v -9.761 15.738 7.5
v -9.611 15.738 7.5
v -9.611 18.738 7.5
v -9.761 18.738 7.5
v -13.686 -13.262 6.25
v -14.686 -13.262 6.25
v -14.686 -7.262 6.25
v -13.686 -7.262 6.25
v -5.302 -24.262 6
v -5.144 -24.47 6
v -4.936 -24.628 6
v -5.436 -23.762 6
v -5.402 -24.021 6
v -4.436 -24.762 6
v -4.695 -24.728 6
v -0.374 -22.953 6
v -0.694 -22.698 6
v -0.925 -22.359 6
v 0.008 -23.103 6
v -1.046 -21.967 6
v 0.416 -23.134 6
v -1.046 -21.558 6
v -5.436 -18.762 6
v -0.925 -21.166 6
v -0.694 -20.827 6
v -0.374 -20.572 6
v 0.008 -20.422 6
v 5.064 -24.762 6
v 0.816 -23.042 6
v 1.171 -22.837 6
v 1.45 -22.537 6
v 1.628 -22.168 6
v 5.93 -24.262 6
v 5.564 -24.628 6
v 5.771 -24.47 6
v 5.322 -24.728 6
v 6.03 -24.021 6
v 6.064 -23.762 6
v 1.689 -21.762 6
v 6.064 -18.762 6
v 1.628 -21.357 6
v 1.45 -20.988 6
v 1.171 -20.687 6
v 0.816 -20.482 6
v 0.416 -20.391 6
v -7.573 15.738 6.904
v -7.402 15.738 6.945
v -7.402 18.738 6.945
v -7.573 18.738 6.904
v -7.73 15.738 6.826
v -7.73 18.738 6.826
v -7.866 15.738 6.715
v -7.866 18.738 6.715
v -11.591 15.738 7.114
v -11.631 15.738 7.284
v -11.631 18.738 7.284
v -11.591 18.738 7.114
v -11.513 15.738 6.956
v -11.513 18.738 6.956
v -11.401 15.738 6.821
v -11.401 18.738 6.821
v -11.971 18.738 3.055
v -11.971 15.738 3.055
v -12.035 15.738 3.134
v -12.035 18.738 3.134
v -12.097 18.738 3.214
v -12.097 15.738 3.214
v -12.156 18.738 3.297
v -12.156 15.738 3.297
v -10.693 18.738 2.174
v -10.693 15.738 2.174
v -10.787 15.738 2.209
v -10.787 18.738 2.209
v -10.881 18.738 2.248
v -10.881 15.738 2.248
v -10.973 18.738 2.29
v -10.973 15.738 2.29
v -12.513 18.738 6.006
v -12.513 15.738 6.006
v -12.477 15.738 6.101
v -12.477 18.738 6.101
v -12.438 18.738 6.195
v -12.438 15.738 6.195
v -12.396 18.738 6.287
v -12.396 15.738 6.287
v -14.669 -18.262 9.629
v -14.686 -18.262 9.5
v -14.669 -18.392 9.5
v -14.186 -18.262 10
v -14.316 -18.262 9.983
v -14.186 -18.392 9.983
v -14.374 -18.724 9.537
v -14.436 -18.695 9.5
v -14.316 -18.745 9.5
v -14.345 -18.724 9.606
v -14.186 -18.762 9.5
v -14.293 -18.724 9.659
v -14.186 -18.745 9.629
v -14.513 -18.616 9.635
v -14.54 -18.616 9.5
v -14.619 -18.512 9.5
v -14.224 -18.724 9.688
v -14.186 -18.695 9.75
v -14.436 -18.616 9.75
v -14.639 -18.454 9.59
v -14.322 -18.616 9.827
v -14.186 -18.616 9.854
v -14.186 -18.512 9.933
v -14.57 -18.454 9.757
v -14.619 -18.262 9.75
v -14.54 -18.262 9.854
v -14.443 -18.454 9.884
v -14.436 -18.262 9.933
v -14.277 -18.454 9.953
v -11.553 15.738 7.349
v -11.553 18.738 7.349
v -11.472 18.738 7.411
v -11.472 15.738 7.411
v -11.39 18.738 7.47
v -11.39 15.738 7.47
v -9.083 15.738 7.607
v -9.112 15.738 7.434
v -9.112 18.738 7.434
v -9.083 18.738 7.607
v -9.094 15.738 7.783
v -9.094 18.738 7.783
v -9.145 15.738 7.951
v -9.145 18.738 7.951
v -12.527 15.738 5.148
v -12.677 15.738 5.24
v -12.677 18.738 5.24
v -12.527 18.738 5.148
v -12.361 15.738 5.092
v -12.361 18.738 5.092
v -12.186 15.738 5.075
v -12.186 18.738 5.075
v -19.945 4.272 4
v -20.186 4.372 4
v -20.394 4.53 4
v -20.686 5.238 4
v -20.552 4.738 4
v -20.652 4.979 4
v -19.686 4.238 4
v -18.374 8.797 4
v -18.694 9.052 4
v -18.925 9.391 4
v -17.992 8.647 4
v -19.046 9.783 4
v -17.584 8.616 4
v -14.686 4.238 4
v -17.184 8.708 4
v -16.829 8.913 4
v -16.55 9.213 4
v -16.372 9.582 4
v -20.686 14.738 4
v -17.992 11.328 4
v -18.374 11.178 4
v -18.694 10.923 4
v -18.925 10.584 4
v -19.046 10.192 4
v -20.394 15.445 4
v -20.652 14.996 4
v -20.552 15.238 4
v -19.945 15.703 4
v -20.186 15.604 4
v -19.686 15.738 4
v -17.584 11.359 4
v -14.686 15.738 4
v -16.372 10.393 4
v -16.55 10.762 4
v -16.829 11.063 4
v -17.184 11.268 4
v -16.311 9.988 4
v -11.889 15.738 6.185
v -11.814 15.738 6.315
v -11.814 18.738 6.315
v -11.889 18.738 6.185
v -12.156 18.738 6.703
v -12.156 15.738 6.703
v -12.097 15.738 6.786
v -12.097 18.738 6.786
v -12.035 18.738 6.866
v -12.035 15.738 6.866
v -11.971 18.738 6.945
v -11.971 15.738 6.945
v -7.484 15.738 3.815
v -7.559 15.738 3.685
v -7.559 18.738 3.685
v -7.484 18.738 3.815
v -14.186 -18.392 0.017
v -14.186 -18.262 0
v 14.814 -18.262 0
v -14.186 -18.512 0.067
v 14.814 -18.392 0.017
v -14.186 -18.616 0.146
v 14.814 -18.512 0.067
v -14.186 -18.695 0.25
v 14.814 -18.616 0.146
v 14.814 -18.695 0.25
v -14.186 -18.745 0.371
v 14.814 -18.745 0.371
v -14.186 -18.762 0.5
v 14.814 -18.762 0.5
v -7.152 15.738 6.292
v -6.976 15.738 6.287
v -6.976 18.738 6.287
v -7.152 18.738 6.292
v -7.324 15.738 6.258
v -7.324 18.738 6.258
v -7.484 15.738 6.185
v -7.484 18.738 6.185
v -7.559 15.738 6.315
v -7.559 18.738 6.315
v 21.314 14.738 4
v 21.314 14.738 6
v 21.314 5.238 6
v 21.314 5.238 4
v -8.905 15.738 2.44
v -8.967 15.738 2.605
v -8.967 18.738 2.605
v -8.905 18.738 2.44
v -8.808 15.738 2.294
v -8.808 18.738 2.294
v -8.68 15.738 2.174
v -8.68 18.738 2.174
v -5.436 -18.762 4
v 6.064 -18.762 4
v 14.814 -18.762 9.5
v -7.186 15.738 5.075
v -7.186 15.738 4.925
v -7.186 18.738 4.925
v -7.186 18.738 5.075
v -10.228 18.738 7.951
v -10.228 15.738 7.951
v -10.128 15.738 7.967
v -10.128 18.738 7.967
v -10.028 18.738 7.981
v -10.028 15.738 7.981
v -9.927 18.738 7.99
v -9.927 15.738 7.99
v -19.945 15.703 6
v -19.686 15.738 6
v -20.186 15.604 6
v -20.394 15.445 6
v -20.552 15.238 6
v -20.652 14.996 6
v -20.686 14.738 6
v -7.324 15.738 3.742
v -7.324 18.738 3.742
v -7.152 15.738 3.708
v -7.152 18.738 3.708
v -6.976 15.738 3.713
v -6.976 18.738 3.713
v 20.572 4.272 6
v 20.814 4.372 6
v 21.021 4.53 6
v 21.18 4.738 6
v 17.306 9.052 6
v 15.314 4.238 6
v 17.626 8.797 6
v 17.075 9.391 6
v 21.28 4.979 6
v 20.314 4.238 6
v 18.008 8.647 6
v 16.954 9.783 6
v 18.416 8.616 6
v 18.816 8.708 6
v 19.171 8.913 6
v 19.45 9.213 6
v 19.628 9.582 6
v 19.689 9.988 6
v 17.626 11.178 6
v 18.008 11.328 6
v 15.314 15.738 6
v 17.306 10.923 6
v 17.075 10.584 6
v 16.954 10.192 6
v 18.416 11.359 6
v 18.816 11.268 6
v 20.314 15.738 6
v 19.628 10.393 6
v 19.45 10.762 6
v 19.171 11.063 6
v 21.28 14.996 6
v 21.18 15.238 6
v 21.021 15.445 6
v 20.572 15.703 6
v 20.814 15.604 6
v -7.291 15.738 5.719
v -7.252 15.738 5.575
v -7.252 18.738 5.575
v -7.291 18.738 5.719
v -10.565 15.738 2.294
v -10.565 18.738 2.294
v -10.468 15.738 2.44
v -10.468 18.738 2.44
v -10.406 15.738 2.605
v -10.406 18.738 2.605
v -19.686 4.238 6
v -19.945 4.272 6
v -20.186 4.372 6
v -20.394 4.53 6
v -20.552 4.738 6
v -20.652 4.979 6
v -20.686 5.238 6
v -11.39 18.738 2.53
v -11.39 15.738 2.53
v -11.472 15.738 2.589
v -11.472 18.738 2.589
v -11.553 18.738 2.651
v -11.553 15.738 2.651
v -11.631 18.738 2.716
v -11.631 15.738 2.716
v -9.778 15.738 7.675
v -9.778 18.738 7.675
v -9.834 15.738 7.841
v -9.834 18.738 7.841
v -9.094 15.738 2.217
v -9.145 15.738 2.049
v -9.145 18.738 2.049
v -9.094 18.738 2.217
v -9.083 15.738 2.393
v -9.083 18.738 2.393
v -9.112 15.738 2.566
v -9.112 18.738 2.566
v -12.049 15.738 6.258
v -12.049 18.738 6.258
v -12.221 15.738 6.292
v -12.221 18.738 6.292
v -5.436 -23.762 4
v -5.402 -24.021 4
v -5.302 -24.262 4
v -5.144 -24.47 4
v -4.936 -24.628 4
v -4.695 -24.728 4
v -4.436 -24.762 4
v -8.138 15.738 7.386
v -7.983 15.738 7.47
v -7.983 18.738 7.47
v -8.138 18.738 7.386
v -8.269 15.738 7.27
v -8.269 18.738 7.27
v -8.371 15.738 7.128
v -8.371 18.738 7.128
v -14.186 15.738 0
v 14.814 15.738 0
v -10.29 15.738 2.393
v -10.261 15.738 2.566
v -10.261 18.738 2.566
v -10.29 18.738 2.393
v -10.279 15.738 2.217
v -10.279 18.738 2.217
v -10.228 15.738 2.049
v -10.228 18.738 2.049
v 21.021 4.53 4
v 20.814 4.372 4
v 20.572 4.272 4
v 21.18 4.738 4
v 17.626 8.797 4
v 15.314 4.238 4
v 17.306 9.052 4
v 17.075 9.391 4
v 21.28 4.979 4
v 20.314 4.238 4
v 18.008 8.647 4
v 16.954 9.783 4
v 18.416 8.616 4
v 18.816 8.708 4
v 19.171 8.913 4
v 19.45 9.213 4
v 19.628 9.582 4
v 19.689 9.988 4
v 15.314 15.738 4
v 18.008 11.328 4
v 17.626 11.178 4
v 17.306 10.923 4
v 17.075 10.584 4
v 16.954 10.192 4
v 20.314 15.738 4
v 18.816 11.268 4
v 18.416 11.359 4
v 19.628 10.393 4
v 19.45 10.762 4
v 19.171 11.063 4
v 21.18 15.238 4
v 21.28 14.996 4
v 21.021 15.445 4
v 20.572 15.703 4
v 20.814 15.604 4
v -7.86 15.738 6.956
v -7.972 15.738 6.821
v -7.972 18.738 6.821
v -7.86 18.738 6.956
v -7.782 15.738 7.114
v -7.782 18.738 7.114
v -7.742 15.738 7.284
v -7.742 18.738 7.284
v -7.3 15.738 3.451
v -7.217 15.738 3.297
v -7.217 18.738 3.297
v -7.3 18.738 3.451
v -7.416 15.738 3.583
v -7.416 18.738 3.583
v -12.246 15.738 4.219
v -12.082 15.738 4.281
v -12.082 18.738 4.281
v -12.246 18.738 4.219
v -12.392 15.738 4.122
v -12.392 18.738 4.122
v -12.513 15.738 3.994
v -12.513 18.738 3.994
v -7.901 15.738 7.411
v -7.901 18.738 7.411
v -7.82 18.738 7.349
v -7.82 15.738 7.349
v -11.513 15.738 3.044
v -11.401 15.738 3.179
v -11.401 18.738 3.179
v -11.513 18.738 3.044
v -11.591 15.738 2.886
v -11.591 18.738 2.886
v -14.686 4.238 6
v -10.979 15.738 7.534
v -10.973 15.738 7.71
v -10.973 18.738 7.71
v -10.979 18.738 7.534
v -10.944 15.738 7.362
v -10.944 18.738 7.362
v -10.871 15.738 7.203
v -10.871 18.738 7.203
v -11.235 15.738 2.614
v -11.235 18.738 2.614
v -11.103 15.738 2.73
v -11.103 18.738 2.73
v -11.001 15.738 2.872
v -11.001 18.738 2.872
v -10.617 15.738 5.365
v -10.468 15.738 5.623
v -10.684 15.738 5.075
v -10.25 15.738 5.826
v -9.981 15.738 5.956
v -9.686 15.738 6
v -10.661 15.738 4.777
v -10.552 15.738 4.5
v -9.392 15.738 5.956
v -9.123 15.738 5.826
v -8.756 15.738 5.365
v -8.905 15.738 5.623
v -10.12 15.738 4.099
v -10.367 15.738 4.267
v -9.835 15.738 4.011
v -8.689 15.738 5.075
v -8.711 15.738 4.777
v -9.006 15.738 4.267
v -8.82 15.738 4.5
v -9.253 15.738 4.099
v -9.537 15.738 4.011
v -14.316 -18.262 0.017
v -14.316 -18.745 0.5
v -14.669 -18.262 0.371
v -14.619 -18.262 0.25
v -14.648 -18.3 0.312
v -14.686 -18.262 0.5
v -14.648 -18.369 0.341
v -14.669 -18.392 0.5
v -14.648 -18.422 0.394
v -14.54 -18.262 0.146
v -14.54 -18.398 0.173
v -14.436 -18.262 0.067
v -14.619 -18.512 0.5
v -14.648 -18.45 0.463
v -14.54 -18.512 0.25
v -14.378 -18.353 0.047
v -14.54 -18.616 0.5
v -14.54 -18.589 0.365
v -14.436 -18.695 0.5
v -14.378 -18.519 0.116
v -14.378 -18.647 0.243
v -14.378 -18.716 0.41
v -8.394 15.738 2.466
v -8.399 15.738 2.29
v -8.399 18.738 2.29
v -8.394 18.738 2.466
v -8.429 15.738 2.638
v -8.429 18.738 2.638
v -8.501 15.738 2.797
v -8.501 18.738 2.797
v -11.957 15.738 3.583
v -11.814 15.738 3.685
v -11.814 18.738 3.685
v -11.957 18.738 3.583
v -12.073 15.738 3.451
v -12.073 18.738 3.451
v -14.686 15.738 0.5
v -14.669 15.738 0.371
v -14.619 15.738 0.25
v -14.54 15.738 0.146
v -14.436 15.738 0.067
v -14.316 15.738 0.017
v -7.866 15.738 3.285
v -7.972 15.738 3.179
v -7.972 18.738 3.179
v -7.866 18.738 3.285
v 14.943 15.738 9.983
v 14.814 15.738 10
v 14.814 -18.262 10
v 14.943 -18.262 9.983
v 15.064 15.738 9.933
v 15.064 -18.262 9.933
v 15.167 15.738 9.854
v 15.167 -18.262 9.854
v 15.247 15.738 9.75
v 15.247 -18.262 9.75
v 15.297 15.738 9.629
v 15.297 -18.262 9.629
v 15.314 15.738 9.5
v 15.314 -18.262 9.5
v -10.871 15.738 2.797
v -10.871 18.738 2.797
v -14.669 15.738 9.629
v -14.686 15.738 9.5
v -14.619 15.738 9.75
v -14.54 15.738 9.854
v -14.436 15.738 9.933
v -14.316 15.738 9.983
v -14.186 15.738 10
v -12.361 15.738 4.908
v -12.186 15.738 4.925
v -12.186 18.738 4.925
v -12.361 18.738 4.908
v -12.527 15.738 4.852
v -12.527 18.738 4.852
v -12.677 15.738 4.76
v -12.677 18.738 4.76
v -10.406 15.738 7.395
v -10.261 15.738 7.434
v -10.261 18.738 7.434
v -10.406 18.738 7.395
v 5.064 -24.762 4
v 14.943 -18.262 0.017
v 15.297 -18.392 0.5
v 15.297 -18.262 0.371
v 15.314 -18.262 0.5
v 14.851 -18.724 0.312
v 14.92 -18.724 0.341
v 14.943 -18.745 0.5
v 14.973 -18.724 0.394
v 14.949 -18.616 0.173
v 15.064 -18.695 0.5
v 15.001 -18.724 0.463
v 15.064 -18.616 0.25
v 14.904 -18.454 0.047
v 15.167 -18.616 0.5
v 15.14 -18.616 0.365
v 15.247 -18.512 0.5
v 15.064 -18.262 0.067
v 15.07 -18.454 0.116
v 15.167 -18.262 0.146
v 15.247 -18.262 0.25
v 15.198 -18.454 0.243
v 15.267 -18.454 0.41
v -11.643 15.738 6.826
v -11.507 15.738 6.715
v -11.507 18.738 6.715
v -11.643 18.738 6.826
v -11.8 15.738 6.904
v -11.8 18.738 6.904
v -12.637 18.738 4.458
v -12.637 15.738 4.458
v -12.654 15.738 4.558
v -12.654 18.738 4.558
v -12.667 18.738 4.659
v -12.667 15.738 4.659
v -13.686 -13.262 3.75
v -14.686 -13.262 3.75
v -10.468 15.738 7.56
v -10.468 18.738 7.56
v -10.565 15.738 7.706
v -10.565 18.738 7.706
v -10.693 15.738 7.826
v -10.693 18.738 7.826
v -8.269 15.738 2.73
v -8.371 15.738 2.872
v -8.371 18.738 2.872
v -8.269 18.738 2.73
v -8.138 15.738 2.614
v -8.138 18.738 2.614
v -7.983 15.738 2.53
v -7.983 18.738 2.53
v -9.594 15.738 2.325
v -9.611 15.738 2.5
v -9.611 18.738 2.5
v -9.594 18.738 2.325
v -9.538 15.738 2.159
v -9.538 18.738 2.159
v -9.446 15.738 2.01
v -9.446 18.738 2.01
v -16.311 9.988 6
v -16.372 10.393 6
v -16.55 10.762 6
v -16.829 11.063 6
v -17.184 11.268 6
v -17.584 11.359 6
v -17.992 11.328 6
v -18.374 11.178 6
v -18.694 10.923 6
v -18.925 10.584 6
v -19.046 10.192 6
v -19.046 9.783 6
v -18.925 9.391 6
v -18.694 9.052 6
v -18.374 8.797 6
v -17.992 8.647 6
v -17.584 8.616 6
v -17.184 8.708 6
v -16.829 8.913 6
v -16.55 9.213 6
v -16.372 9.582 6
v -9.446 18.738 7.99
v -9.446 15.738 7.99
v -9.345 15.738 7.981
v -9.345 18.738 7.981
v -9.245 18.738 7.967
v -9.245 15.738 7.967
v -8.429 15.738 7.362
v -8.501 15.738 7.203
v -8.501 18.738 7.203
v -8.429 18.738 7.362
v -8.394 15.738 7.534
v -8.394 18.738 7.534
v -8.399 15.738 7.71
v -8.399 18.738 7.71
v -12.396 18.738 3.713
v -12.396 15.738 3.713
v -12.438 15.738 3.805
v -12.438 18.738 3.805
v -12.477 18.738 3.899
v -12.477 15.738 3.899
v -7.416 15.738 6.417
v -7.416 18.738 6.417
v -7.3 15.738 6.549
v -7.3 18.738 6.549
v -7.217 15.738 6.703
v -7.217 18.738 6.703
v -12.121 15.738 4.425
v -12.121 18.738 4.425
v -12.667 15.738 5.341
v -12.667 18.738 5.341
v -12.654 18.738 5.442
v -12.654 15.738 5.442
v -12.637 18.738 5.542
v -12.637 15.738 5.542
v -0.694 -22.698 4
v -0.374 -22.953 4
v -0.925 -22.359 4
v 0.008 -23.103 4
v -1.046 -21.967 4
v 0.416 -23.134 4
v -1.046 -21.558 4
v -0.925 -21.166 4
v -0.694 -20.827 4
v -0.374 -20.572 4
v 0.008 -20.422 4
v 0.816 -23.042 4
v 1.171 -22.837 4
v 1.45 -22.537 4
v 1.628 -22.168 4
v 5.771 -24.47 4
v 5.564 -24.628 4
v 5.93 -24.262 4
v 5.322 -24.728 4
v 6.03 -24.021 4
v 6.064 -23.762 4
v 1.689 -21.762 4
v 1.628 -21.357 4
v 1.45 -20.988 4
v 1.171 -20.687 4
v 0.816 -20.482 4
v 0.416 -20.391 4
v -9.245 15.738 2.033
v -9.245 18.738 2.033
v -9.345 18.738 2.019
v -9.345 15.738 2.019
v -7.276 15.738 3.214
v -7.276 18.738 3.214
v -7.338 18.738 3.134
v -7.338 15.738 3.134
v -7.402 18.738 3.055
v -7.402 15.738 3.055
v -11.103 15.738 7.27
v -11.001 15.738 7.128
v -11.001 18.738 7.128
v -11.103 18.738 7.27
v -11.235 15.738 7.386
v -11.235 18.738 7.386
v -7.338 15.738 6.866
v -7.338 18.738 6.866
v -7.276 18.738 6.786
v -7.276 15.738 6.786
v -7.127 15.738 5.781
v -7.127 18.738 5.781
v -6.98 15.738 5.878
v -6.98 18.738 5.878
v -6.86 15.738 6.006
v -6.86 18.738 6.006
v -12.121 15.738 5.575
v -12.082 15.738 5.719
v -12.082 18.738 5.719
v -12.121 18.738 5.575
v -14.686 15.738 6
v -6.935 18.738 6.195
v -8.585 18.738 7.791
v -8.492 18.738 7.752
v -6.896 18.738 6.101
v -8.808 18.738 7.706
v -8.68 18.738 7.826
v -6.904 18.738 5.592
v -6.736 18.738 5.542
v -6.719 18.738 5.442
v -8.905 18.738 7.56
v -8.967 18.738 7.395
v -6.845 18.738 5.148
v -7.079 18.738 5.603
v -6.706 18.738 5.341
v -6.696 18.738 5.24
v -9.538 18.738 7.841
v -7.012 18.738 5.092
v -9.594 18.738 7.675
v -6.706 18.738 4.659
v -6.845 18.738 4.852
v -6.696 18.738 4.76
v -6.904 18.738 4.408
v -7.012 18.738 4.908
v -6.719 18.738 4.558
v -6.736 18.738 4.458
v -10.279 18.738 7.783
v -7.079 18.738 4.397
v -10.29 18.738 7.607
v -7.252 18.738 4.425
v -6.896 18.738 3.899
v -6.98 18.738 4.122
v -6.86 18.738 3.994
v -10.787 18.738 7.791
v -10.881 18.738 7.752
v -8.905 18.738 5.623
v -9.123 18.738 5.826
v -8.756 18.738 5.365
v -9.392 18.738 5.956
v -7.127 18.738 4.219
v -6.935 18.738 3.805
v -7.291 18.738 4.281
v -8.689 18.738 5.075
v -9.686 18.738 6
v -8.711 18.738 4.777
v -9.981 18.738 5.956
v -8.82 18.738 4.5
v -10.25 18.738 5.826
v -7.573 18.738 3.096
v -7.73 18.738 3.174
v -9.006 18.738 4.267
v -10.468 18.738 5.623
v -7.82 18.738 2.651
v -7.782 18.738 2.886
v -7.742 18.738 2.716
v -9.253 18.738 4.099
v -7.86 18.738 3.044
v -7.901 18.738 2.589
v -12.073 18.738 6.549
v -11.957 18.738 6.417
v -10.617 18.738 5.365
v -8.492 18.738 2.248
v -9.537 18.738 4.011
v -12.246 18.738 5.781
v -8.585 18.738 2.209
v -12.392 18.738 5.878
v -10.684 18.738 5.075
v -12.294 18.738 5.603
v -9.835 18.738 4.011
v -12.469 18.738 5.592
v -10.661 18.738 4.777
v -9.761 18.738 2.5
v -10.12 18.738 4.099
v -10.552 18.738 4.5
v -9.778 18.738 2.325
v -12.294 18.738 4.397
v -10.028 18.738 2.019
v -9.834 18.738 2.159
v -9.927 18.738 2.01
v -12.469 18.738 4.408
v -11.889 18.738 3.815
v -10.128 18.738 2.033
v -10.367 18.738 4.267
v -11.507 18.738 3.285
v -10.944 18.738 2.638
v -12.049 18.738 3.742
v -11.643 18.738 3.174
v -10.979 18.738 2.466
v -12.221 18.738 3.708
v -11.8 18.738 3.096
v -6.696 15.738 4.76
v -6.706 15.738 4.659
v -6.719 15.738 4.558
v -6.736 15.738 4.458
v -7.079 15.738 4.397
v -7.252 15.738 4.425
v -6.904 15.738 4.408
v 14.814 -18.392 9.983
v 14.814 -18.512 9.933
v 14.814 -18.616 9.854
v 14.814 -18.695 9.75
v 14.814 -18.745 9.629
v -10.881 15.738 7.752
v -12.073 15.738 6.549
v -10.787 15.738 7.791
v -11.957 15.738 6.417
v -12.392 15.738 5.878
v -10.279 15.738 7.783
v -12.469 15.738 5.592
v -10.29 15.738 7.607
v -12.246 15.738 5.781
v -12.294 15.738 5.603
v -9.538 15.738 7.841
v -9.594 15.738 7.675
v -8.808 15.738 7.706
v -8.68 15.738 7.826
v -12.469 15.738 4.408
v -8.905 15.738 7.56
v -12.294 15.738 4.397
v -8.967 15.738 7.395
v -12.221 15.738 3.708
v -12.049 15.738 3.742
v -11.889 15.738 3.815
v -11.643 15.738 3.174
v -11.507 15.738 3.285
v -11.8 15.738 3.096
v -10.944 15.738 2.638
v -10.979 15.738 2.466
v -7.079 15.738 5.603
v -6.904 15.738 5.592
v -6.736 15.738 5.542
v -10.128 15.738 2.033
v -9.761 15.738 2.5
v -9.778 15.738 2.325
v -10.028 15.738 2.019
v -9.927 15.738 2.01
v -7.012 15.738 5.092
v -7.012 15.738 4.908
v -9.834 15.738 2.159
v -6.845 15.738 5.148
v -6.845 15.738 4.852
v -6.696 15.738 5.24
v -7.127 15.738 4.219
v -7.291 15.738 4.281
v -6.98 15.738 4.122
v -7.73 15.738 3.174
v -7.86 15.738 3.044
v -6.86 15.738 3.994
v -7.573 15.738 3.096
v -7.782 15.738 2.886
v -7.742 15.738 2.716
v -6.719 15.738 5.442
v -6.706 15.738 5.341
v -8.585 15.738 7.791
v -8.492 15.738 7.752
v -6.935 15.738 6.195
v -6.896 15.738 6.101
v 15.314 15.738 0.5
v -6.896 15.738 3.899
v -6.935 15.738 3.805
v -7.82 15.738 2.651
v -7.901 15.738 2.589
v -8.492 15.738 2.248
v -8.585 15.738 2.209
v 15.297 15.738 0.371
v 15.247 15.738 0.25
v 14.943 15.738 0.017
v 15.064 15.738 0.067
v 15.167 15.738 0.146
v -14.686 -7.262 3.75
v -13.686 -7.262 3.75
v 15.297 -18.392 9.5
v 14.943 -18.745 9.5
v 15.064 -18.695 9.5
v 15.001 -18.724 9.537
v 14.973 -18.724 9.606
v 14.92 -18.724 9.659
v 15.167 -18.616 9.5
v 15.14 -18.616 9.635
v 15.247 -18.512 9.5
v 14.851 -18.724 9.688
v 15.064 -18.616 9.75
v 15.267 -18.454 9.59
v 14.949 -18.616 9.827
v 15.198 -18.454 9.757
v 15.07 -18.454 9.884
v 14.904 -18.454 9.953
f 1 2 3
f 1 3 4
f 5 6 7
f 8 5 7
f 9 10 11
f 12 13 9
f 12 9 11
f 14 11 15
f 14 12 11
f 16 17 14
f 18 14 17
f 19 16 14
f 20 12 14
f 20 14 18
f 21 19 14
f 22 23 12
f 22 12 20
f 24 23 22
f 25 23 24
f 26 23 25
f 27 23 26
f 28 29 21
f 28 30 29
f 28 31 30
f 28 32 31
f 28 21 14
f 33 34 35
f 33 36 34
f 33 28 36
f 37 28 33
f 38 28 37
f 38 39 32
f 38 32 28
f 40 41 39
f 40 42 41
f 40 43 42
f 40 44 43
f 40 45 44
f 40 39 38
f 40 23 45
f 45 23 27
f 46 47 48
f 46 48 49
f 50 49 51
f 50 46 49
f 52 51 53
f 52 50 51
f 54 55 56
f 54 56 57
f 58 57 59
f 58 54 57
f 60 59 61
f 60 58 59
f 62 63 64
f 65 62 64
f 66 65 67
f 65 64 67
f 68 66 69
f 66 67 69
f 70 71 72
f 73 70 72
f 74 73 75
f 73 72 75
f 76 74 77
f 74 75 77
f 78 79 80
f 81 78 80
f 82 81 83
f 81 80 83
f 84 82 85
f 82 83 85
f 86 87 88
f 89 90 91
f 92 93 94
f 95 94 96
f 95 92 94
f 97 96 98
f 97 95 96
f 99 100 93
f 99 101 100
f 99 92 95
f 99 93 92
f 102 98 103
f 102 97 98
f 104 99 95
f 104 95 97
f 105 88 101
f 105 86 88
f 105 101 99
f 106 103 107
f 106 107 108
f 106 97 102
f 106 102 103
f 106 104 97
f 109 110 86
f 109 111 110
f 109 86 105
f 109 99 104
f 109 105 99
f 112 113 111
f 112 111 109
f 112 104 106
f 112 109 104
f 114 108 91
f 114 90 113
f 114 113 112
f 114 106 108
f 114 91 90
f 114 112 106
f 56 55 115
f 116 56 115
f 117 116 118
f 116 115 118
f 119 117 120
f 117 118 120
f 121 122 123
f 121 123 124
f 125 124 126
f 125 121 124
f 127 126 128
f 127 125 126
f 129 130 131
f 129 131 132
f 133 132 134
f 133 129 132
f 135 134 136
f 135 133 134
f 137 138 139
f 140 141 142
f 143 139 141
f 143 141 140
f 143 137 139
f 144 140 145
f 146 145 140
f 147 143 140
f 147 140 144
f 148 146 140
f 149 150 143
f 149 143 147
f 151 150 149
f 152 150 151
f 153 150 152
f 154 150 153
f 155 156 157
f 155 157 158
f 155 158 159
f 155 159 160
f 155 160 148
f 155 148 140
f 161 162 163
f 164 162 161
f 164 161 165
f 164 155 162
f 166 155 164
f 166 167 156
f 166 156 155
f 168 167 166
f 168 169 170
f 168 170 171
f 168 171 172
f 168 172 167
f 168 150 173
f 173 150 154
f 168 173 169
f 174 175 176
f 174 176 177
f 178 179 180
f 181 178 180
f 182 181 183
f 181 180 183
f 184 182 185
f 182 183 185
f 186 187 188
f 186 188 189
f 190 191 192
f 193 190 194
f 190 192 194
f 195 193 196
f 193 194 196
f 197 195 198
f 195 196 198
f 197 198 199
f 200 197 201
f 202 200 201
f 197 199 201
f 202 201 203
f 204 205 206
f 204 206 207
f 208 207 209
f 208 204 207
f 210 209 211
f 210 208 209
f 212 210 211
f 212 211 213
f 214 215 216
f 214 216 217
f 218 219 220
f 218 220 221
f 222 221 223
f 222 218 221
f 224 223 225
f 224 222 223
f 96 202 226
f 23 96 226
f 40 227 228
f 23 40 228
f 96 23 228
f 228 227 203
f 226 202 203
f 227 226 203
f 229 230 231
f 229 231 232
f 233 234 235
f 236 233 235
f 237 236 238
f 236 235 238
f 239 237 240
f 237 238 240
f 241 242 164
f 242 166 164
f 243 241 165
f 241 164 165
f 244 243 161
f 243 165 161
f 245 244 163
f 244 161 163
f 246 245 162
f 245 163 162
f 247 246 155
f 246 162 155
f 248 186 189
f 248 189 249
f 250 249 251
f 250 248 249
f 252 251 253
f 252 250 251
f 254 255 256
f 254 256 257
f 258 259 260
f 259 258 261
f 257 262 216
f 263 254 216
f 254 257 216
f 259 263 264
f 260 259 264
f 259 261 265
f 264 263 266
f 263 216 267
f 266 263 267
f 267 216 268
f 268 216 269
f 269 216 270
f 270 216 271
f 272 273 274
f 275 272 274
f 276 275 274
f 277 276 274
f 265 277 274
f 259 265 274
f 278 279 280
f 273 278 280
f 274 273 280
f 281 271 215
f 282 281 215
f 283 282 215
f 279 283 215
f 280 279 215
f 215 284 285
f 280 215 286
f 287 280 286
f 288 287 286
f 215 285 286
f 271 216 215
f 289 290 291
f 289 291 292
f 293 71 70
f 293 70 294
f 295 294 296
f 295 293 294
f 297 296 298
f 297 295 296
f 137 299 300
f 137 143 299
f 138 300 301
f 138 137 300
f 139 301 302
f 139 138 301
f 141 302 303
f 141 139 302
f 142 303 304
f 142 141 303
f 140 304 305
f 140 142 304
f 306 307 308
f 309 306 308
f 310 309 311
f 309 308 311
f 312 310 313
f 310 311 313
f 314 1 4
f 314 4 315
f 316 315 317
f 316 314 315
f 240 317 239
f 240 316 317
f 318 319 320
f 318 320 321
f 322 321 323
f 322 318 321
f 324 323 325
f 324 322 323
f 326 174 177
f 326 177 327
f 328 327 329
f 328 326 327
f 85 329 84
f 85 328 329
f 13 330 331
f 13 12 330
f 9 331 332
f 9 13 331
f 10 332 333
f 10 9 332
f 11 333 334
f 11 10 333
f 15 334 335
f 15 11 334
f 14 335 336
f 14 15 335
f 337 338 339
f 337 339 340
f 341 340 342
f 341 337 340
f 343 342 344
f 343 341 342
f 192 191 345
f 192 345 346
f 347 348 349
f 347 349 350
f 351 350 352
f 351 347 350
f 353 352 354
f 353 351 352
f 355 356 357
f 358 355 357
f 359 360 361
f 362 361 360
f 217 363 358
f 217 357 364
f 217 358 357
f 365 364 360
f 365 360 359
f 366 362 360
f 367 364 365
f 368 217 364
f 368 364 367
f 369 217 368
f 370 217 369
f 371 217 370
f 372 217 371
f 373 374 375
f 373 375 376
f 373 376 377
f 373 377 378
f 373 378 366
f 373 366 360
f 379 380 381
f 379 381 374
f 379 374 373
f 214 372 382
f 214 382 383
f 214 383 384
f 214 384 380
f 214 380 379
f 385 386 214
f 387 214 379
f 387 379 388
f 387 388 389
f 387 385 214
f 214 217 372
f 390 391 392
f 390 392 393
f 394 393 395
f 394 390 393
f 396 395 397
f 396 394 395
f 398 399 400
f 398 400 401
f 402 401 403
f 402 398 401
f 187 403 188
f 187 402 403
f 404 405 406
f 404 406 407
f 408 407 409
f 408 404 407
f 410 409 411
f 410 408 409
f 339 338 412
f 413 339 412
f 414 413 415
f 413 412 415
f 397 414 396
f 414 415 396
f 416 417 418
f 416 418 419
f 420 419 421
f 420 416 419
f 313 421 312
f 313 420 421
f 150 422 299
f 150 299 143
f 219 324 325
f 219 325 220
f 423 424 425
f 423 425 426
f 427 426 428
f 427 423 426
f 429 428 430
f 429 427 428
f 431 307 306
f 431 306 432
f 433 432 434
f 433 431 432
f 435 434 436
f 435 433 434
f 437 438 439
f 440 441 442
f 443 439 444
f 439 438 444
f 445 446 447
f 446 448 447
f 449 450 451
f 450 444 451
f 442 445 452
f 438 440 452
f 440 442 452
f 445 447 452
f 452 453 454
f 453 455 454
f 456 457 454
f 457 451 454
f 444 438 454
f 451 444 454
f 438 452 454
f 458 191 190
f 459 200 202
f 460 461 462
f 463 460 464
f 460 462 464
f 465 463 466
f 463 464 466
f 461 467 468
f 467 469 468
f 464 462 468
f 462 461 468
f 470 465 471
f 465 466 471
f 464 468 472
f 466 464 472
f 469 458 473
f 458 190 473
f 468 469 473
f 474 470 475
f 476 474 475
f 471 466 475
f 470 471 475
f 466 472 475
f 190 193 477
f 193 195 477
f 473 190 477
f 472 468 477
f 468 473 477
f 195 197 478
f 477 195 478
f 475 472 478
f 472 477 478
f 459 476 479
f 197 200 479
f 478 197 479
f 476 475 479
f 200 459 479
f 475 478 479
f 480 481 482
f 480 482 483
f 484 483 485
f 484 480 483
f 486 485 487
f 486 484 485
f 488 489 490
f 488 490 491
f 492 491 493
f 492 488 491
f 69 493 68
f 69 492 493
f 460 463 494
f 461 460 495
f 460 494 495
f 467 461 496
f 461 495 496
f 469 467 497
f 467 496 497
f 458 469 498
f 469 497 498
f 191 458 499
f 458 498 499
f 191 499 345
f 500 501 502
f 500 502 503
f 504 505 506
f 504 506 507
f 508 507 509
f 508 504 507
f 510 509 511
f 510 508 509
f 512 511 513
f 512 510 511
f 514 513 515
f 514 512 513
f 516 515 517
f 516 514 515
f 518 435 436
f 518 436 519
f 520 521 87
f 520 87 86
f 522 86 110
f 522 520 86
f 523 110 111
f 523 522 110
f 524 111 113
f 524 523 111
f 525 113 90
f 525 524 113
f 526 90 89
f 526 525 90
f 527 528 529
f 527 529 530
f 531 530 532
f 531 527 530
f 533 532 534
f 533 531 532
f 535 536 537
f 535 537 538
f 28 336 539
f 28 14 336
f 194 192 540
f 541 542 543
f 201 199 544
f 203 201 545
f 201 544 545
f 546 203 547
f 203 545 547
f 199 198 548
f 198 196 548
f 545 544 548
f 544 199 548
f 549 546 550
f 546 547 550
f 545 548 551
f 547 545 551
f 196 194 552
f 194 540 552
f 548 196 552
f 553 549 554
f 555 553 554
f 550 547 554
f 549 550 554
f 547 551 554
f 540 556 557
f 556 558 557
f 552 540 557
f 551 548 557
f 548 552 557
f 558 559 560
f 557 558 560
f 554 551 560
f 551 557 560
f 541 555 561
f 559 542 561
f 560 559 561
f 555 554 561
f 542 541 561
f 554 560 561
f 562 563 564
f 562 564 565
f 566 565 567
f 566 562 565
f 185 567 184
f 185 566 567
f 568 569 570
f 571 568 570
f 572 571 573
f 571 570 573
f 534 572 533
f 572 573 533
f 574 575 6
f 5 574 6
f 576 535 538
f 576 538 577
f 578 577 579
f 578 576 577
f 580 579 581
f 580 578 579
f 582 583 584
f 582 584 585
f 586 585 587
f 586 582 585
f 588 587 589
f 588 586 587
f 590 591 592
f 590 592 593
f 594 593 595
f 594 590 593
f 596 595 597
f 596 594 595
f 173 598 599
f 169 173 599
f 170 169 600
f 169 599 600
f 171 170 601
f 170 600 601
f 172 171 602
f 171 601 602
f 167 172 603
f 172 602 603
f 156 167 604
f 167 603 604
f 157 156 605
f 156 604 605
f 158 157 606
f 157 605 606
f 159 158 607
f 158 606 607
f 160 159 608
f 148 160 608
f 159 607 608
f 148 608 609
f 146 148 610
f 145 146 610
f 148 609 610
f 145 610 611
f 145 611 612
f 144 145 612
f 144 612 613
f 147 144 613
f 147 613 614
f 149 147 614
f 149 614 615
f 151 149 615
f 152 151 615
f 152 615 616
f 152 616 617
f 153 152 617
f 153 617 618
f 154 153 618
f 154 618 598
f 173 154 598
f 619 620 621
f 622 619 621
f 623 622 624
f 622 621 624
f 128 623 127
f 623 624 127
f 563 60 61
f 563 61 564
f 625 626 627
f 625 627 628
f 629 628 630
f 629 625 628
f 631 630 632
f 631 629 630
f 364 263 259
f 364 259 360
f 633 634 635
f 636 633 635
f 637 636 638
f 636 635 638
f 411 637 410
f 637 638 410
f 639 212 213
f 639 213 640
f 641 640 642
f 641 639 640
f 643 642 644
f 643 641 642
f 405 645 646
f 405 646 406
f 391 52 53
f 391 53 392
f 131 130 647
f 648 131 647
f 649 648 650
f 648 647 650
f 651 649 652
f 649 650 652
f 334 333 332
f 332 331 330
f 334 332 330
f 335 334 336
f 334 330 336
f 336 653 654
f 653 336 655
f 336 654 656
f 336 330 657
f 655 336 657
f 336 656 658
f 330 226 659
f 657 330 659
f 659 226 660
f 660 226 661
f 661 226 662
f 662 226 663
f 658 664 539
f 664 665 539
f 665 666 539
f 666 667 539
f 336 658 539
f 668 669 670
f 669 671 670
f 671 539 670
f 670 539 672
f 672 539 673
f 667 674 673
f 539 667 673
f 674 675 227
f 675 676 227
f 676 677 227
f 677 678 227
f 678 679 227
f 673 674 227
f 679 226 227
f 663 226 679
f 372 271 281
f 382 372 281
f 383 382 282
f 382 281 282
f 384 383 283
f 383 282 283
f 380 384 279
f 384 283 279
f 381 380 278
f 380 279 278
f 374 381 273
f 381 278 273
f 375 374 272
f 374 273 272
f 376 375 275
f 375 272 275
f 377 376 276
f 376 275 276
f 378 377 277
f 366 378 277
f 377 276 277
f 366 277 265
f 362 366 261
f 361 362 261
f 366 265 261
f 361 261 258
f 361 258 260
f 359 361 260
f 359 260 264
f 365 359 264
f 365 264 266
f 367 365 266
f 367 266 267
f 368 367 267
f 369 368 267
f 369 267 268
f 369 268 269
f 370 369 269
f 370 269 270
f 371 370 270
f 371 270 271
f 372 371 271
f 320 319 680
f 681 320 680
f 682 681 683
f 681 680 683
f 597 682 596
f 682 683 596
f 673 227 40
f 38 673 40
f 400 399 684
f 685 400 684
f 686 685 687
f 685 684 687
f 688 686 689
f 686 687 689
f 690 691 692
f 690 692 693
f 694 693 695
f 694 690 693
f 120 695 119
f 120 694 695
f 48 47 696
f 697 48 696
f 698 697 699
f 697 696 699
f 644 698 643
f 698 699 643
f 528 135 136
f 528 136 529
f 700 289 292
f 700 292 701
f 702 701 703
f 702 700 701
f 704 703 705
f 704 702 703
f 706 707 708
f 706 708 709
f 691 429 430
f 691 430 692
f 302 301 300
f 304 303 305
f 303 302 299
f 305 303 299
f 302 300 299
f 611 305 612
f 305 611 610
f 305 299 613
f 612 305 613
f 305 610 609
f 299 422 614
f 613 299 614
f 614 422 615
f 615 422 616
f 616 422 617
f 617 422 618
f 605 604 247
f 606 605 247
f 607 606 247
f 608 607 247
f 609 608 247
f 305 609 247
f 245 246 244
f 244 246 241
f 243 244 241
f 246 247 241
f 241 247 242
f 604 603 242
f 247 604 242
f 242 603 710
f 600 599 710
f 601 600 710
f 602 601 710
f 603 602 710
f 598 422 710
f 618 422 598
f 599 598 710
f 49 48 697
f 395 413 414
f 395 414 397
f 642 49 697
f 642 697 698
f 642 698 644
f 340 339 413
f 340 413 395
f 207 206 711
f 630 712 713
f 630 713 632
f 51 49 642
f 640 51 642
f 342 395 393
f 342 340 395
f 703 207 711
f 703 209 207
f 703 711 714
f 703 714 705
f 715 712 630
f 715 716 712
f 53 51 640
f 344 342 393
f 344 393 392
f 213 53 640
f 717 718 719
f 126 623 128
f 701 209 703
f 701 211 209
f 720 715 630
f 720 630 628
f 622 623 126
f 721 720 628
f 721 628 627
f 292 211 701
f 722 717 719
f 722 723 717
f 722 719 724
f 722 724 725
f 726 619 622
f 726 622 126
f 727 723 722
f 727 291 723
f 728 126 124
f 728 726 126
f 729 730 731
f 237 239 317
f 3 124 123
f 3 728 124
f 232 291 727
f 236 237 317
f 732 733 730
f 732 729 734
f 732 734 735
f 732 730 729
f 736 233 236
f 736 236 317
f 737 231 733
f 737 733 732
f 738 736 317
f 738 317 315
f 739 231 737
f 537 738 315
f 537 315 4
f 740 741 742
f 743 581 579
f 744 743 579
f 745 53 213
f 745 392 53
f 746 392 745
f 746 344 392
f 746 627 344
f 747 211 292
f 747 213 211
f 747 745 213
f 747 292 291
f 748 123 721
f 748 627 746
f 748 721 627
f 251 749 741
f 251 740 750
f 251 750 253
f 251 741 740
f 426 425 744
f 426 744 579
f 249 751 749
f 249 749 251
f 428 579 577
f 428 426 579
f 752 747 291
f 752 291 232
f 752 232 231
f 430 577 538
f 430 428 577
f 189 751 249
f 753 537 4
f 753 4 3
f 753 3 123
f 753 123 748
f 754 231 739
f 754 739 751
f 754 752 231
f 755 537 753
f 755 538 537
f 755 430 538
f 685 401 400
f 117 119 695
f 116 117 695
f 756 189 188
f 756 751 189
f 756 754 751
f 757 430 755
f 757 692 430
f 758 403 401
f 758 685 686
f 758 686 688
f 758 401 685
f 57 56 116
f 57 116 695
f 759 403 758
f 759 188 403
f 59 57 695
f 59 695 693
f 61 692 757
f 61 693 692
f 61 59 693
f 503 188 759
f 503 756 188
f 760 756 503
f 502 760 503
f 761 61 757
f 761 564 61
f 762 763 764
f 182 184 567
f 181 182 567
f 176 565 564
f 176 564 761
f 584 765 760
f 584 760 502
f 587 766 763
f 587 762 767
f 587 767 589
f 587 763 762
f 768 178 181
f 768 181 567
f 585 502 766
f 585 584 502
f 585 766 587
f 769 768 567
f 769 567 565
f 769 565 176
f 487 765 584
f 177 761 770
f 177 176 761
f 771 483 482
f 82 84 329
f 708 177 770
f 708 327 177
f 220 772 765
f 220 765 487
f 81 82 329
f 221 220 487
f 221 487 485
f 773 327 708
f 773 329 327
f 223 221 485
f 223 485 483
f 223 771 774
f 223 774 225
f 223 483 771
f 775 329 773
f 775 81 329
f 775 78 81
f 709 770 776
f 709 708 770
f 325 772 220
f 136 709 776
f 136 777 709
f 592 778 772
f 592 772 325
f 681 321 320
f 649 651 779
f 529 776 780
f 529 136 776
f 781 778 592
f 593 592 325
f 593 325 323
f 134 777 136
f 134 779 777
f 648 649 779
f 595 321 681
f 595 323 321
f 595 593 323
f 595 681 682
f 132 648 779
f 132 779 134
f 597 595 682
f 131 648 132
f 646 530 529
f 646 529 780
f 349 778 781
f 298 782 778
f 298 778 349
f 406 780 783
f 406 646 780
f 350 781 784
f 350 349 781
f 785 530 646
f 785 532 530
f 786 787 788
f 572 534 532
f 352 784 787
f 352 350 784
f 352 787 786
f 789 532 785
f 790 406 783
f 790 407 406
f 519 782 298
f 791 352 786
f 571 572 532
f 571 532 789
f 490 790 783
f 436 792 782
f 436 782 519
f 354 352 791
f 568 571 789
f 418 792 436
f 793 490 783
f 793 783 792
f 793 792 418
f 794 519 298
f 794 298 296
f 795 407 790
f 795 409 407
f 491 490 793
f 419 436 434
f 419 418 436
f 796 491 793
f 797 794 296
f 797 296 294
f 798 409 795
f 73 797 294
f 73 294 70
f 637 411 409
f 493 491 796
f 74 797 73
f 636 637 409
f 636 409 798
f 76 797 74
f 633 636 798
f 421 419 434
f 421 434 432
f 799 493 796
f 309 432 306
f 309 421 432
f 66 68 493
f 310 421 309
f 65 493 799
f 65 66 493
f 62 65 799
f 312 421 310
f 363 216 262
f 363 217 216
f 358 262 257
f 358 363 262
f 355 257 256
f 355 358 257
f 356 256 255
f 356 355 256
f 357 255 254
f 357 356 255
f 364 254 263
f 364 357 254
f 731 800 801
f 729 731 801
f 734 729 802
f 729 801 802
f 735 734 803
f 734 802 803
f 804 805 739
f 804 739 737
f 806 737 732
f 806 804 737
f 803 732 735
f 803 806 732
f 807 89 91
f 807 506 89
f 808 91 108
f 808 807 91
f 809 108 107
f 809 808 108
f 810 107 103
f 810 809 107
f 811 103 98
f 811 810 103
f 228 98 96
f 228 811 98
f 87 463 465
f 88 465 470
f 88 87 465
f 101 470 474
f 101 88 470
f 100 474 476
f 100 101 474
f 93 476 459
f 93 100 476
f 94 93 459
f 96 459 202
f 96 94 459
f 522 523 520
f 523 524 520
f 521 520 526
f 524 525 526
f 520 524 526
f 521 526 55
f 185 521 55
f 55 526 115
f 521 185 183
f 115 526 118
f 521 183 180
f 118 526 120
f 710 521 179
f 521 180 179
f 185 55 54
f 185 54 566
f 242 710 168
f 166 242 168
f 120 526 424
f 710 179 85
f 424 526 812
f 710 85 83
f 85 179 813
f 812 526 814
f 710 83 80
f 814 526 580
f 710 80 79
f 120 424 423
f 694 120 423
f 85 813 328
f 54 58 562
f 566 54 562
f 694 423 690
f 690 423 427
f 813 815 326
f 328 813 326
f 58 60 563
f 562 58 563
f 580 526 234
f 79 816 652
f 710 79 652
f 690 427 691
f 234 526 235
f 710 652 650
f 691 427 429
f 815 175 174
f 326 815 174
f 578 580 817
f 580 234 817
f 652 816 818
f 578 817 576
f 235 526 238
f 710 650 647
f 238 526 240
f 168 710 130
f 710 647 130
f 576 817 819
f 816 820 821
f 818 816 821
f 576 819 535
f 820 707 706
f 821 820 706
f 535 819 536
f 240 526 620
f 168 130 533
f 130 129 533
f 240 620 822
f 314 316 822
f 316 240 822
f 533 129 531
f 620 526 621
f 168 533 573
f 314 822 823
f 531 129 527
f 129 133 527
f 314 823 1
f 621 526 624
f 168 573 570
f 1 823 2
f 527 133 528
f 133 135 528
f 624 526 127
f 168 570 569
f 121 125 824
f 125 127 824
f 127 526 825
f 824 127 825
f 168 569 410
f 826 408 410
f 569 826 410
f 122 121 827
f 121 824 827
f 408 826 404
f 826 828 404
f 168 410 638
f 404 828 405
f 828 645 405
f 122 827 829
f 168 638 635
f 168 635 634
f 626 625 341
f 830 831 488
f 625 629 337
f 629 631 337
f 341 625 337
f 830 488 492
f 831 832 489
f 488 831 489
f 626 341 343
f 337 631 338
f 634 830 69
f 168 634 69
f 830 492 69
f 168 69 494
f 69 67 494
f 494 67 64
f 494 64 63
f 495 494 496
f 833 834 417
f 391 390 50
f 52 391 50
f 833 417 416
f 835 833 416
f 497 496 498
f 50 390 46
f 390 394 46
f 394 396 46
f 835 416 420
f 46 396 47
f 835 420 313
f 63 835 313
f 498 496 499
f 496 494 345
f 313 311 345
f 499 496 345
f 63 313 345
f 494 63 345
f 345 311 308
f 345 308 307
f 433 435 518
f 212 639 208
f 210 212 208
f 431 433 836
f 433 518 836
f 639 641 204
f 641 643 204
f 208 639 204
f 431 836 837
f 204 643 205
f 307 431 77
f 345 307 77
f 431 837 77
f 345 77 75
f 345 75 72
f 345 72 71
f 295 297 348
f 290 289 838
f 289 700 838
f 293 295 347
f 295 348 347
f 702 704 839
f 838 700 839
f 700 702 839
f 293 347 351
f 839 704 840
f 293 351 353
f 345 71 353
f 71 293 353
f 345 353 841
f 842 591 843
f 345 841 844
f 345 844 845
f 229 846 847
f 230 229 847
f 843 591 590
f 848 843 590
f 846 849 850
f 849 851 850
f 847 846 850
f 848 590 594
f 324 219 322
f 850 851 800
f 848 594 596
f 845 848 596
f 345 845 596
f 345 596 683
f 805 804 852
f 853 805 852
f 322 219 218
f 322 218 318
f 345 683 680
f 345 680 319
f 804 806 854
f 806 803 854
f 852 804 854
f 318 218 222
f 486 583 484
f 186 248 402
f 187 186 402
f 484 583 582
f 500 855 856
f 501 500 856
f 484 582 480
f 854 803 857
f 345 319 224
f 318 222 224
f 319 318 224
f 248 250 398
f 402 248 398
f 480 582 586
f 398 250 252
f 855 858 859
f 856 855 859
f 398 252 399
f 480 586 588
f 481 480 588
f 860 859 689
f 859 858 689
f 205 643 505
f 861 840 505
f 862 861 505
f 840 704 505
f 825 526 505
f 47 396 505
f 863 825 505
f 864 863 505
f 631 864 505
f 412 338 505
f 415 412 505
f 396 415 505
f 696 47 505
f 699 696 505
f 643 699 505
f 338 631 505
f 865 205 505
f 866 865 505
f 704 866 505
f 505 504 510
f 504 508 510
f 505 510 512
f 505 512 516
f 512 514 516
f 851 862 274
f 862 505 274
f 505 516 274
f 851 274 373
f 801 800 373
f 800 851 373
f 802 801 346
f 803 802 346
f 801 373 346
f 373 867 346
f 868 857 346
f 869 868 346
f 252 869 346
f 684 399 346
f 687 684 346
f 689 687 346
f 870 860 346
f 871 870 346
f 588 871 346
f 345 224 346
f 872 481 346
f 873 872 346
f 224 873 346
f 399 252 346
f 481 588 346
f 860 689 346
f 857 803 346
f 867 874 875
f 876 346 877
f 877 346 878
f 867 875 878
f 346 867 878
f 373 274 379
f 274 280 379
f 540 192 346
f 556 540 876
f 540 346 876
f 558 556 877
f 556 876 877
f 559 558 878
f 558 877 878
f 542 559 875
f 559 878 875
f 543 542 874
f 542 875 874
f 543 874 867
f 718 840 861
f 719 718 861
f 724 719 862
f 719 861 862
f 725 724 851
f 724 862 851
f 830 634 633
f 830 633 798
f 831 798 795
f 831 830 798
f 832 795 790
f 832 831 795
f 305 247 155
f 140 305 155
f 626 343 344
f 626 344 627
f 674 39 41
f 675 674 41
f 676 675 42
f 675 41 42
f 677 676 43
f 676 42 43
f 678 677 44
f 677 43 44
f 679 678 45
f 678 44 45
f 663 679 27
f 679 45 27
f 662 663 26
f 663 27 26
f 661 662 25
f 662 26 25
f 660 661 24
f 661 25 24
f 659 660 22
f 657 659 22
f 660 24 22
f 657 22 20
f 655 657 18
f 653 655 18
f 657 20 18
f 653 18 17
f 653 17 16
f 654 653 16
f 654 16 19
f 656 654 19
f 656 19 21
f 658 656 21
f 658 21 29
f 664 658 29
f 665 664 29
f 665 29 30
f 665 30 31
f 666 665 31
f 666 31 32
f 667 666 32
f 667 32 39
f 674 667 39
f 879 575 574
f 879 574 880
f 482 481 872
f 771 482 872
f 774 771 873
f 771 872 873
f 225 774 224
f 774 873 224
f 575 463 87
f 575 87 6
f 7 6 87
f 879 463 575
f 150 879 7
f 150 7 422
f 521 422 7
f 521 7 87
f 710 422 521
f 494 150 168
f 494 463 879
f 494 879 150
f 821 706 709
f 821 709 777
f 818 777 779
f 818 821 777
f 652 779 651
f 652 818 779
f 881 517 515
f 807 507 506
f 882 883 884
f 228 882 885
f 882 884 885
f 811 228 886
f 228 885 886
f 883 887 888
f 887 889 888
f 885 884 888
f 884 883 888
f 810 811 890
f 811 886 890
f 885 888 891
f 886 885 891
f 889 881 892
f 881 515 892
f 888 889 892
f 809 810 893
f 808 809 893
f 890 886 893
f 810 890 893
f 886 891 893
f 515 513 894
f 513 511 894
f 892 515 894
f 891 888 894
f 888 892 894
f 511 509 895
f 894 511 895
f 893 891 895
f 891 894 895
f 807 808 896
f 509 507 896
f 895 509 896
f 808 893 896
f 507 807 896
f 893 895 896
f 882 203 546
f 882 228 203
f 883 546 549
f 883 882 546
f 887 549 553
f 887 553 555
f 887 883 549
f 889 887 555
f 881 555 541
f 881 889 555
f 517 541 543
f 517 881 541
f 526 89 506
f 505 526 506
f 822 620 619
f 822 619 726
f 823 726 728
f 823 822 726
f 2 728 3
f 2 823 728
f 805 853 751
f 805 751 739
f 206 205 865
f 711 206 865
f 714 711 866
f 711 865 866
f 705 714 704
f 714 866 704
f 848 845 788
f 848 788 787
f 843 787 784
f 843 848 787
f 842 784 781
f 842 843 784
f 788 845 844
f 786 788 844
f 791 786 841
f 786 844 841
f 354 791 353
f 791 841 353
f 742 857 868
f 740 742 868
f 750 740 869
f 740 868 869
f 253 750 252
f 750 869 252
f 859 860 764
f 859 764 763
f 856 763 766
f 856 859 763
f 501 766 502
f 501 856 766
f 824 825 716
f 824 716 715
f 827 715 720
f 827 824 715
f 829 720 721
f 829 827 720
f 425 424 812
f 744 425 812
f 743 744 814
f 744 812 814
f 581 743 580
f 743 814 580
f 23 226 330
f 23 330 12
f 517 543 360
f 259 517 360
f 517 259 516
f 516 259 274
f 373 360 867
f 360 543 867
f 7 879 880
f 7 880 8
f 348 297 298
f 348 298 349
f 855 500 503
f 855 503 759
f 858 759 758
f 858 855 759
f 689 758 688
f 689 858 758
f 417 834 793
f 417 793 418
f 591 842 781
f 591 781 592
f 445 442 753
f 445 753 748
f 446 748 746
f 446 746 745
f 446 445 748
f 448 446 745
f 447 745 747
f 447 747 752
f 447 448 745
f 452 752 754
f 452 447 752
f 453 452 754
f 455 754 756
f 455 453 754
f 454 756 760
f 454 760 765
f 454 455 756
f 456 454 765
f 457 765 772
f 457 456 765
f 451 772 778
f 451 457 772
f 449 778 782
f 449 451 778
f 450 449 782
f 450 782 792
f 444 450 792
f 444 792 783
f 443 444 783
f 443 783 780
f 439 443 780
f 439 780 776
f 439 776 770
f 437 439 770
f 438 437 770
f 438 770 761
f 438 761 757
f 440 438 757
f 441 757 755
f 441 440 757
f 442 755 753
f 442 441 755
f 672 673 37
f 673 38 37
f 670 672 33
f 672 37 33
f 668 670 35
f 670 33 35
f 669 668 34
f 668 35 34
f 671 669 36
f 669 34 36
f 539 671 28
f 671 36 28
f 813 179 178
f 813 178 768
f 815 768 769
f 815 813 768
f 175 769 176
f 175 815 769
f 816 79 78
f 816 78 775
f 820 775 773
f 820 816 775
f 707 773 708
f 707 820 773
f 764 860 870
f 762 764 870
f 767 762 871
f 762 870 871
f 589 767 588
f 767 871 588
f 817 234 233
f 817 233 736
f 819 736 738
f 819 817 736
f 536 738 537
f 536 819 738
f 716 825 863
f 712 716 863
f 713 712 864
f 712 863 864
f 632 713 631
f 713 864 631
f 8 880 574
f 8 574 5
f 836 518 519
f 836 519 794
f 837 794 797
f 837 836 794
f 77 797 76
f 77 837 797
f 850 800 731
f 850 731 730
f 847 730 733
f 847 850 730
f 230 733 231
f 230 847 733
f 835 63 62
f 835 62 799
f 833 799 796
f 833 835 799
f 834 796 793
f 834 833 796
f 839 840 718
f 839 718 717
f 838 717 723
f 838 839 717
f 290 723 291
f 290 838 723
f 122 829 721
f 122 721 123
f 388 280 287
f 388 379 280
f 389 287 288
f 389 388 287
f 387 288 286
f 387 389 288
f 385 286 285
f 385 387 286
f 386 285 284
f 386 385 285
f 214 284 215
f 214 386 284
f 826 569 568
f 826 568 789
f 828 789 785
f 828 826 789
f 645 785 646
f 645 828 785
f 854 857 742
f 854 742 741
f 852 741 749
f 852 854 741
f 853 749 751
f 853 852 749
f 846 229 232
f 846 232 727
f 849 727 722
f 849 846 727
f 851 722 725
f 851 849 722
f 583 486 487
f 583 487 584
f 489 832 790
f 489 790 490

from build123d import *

# Parameters (mm, degrees)
SKETCH1_W           = 30
SKETCH1_H           = 34.5
BOSS_EXTRUDE1_DEPTH = 10
SKETCH2_W           = 2
SKETCH2_H           = 11.5
BOSS_EXTRUDE4_DEPTH = 21
SKETCH3_W           = 11.5
SKETCH3_H           = 2
BOSS_EXTRUDE5_DEPTH = 6
FILLET2_R           = 1
SKETCH4_R           = 1.375
CUT_EXTRUDE1_DEPTH  = 10
FILLET3_R           = 0.5
SKETCH5_W           = 2.5
SKETCH5_H           = 6
CUT_EXTRUDE2_DEPTH  = 1
SKETCH6_R           = 3
SKETCH6_R_2         = 1
BOSS_EXTRUDE6_DEPTH = 3
CUT_EXTRUDE3_START  = -3
CUT_EXTRUDE3_DEPTH  = 3
CIRPATTERN1_COUNT   = 24


with BuildPart() as part:
    # Sketch1 → Boss-Extrude1 (new body)
    with BuildSketch(Plane.XY):
        with Locations((0.31359995, -1.512440758)):
            Rectangle(SKETCH1_W, SKETCH1_H)
    extrude(amount=BOSS_EXTRUDE1_DEPTH)

    # Sketch2 → Boss-Extrude4 (add, symmetric)
    with BuildSketch(Plane(origin=(0.31359995, 0, 0), x_dir=(0, 0, -1), z_dir=(1, 0, 0))):
        with Locations((-5, 9.987559242)):
            Rectangle(SKETCH2_W, SKETCH2_H)
    extrude(amount=BOSS_EXTRUDE4_DEPTH, both=True)

    # Sketch3 → Boss-Extrude5 (add)
    with BuildSketch(Plane.XZ.offset(18.762440758)):
        with Locations((0.31359995, 5)):
            Rectangle(SKETCH3_W, SKETCH3_H)
    extrude(amount=BOSS_EXTRUDE5_DEPTH)

    # Fillet2
    fillet2_edges = [part.edges().sort_by_distance(p)[0] for p in [
        (21.31359995, 15.737559242, 5),
        (-20.68640005, 4.237559242, 5),
        (21.31359995, 4.237559242, 5),
        (-20.68640005, 15.737559242, 5),
        (-5.43640005, -24.762440758, 5),
        (6.06359995, -24.762440758, 5),
    ]]
    fillet(fillet2_edges, radius=FILLET2_R)

    # Sketch4 → Cut-Extrude1 (cut)
    with BuildSketch(Plane.XY.offset(10)):
        with Locations((-17.68640005, 9.987559242)):
            Circle(SKETCH4_R)
        with Locations((18.31359995, 9.987559242)):
            Circle(SKETCH4_R)
        with Locations((0.31359995, -21.762440758)):
            Circle(SKETCH4_R)
    extrude(amount=-CUT_EXTRUDE1_DEPTH, mode=Mode.SUBTRACT)

    # Fillet3
    fillet3_edges = [part.edges().sort_by_distance(p)[0] for p in [
        (15.31359995, -1.512440758, 10),
        (-14.68640005, -1.512440758, 10),
        (15.31359995, -1.512440758, 0),
        (0.31359995, -18.762440758, 0),
        (-14.68640005, -1.512440758, 0),
        (15.31359995, -18.762440758, 5),
        (-14.68640005, -18.762440758, 5),
        (0.31359995, -18.762440758, 10),
    ]]
    fillet(fillet3_edges, radius=FILLET3_R)

    # Sketch5 → Cut-Extrude2 (cut)
    with BuildSketch(Plane.ZY.offset(14.68640005)):
        with Locations((5, -10.262440758)):
            Rectangle(SKETCH5_W, SKETCH5_H)
    extrude(amount=-CUT_EXTRUDE2_DEPTH, mode=Mode.SUBTRACT)

    # Sketch6 → Boss-Extrude6 (add)
    with BuildSketch(Plane(origin=(0, 15.737559242, 0), x_dir=(1, 0, 0), z_dir=(0, 1, 0))):
        with Locations(Location((-9.68640005, -5, 0), (0, 0, 90))):
            Circle(SKETCH6_R)
        with Locations(Location((-9.68640005, -5, 0), (0, 0, 270))):
            Circle(SKETCH6_R_2, mode=Mode.SUBTRACT)
    extrude(amount=BOSS_EXTRUDE6_DEPTH)

    # Sketch7 → Cut-Extrude3 (cut)
    with BuildSketch(Plane(origin=(0, 18.737559242, 0), x_dir=(1, 0, 0), z_dir=(0, 1, 0)).offset(CUT_EXTRUDE3_START)):
        with BuildLine():
            Line((-9.68640005, -2), (-9.68640005, -2.5))
            Line((-9.68640005, -2.5), (-9.61140005, -2.5))
            ThreePointArc((-9.61140005, -2.5), (-9.571129509, -2.240512735), (-9.446003633, -2.009647251))
            ThreePointArc((-9.446003633, -2.009647251), (-9.566105093, -2.002412783), (-9.68640005, -2))
        make_face()
        with BuildLine():
            Line((-9.76140005, -2.5), (-9.68640005, -2.5))
            Line((-9.68640005, -2.5), (-9.68640005, -2))
            ThreePointArc((-9.68640005, -2), (-9.806695006, -2.002412783), (-9.926796466, -2.009647251))
            ThreePointArc((-9.926796466, -2.009647251), (-9.80167059, -2.240512735), (-9.76140005, -2.5))
        make_face()
    cut_extrude3 = extrude(amount=CUT_EXTRUDE3_DEPTH, mode=Mode.SUBTRACT)

    # CirPattern1: Cut-Extrude3 ×24 about axis
    cirpattern1_axis = Axis((-9.68640005, 0, 5), (0, 1, 0))
    for i in range(1, CIRPATTERN1_COUNT):
        add(cut_extrude3.rotate(cirpattern1_axis, i * 360 / CIRPATTERN1_COUNT), mode=Mode.SUBTRACT)


solid = part.part
